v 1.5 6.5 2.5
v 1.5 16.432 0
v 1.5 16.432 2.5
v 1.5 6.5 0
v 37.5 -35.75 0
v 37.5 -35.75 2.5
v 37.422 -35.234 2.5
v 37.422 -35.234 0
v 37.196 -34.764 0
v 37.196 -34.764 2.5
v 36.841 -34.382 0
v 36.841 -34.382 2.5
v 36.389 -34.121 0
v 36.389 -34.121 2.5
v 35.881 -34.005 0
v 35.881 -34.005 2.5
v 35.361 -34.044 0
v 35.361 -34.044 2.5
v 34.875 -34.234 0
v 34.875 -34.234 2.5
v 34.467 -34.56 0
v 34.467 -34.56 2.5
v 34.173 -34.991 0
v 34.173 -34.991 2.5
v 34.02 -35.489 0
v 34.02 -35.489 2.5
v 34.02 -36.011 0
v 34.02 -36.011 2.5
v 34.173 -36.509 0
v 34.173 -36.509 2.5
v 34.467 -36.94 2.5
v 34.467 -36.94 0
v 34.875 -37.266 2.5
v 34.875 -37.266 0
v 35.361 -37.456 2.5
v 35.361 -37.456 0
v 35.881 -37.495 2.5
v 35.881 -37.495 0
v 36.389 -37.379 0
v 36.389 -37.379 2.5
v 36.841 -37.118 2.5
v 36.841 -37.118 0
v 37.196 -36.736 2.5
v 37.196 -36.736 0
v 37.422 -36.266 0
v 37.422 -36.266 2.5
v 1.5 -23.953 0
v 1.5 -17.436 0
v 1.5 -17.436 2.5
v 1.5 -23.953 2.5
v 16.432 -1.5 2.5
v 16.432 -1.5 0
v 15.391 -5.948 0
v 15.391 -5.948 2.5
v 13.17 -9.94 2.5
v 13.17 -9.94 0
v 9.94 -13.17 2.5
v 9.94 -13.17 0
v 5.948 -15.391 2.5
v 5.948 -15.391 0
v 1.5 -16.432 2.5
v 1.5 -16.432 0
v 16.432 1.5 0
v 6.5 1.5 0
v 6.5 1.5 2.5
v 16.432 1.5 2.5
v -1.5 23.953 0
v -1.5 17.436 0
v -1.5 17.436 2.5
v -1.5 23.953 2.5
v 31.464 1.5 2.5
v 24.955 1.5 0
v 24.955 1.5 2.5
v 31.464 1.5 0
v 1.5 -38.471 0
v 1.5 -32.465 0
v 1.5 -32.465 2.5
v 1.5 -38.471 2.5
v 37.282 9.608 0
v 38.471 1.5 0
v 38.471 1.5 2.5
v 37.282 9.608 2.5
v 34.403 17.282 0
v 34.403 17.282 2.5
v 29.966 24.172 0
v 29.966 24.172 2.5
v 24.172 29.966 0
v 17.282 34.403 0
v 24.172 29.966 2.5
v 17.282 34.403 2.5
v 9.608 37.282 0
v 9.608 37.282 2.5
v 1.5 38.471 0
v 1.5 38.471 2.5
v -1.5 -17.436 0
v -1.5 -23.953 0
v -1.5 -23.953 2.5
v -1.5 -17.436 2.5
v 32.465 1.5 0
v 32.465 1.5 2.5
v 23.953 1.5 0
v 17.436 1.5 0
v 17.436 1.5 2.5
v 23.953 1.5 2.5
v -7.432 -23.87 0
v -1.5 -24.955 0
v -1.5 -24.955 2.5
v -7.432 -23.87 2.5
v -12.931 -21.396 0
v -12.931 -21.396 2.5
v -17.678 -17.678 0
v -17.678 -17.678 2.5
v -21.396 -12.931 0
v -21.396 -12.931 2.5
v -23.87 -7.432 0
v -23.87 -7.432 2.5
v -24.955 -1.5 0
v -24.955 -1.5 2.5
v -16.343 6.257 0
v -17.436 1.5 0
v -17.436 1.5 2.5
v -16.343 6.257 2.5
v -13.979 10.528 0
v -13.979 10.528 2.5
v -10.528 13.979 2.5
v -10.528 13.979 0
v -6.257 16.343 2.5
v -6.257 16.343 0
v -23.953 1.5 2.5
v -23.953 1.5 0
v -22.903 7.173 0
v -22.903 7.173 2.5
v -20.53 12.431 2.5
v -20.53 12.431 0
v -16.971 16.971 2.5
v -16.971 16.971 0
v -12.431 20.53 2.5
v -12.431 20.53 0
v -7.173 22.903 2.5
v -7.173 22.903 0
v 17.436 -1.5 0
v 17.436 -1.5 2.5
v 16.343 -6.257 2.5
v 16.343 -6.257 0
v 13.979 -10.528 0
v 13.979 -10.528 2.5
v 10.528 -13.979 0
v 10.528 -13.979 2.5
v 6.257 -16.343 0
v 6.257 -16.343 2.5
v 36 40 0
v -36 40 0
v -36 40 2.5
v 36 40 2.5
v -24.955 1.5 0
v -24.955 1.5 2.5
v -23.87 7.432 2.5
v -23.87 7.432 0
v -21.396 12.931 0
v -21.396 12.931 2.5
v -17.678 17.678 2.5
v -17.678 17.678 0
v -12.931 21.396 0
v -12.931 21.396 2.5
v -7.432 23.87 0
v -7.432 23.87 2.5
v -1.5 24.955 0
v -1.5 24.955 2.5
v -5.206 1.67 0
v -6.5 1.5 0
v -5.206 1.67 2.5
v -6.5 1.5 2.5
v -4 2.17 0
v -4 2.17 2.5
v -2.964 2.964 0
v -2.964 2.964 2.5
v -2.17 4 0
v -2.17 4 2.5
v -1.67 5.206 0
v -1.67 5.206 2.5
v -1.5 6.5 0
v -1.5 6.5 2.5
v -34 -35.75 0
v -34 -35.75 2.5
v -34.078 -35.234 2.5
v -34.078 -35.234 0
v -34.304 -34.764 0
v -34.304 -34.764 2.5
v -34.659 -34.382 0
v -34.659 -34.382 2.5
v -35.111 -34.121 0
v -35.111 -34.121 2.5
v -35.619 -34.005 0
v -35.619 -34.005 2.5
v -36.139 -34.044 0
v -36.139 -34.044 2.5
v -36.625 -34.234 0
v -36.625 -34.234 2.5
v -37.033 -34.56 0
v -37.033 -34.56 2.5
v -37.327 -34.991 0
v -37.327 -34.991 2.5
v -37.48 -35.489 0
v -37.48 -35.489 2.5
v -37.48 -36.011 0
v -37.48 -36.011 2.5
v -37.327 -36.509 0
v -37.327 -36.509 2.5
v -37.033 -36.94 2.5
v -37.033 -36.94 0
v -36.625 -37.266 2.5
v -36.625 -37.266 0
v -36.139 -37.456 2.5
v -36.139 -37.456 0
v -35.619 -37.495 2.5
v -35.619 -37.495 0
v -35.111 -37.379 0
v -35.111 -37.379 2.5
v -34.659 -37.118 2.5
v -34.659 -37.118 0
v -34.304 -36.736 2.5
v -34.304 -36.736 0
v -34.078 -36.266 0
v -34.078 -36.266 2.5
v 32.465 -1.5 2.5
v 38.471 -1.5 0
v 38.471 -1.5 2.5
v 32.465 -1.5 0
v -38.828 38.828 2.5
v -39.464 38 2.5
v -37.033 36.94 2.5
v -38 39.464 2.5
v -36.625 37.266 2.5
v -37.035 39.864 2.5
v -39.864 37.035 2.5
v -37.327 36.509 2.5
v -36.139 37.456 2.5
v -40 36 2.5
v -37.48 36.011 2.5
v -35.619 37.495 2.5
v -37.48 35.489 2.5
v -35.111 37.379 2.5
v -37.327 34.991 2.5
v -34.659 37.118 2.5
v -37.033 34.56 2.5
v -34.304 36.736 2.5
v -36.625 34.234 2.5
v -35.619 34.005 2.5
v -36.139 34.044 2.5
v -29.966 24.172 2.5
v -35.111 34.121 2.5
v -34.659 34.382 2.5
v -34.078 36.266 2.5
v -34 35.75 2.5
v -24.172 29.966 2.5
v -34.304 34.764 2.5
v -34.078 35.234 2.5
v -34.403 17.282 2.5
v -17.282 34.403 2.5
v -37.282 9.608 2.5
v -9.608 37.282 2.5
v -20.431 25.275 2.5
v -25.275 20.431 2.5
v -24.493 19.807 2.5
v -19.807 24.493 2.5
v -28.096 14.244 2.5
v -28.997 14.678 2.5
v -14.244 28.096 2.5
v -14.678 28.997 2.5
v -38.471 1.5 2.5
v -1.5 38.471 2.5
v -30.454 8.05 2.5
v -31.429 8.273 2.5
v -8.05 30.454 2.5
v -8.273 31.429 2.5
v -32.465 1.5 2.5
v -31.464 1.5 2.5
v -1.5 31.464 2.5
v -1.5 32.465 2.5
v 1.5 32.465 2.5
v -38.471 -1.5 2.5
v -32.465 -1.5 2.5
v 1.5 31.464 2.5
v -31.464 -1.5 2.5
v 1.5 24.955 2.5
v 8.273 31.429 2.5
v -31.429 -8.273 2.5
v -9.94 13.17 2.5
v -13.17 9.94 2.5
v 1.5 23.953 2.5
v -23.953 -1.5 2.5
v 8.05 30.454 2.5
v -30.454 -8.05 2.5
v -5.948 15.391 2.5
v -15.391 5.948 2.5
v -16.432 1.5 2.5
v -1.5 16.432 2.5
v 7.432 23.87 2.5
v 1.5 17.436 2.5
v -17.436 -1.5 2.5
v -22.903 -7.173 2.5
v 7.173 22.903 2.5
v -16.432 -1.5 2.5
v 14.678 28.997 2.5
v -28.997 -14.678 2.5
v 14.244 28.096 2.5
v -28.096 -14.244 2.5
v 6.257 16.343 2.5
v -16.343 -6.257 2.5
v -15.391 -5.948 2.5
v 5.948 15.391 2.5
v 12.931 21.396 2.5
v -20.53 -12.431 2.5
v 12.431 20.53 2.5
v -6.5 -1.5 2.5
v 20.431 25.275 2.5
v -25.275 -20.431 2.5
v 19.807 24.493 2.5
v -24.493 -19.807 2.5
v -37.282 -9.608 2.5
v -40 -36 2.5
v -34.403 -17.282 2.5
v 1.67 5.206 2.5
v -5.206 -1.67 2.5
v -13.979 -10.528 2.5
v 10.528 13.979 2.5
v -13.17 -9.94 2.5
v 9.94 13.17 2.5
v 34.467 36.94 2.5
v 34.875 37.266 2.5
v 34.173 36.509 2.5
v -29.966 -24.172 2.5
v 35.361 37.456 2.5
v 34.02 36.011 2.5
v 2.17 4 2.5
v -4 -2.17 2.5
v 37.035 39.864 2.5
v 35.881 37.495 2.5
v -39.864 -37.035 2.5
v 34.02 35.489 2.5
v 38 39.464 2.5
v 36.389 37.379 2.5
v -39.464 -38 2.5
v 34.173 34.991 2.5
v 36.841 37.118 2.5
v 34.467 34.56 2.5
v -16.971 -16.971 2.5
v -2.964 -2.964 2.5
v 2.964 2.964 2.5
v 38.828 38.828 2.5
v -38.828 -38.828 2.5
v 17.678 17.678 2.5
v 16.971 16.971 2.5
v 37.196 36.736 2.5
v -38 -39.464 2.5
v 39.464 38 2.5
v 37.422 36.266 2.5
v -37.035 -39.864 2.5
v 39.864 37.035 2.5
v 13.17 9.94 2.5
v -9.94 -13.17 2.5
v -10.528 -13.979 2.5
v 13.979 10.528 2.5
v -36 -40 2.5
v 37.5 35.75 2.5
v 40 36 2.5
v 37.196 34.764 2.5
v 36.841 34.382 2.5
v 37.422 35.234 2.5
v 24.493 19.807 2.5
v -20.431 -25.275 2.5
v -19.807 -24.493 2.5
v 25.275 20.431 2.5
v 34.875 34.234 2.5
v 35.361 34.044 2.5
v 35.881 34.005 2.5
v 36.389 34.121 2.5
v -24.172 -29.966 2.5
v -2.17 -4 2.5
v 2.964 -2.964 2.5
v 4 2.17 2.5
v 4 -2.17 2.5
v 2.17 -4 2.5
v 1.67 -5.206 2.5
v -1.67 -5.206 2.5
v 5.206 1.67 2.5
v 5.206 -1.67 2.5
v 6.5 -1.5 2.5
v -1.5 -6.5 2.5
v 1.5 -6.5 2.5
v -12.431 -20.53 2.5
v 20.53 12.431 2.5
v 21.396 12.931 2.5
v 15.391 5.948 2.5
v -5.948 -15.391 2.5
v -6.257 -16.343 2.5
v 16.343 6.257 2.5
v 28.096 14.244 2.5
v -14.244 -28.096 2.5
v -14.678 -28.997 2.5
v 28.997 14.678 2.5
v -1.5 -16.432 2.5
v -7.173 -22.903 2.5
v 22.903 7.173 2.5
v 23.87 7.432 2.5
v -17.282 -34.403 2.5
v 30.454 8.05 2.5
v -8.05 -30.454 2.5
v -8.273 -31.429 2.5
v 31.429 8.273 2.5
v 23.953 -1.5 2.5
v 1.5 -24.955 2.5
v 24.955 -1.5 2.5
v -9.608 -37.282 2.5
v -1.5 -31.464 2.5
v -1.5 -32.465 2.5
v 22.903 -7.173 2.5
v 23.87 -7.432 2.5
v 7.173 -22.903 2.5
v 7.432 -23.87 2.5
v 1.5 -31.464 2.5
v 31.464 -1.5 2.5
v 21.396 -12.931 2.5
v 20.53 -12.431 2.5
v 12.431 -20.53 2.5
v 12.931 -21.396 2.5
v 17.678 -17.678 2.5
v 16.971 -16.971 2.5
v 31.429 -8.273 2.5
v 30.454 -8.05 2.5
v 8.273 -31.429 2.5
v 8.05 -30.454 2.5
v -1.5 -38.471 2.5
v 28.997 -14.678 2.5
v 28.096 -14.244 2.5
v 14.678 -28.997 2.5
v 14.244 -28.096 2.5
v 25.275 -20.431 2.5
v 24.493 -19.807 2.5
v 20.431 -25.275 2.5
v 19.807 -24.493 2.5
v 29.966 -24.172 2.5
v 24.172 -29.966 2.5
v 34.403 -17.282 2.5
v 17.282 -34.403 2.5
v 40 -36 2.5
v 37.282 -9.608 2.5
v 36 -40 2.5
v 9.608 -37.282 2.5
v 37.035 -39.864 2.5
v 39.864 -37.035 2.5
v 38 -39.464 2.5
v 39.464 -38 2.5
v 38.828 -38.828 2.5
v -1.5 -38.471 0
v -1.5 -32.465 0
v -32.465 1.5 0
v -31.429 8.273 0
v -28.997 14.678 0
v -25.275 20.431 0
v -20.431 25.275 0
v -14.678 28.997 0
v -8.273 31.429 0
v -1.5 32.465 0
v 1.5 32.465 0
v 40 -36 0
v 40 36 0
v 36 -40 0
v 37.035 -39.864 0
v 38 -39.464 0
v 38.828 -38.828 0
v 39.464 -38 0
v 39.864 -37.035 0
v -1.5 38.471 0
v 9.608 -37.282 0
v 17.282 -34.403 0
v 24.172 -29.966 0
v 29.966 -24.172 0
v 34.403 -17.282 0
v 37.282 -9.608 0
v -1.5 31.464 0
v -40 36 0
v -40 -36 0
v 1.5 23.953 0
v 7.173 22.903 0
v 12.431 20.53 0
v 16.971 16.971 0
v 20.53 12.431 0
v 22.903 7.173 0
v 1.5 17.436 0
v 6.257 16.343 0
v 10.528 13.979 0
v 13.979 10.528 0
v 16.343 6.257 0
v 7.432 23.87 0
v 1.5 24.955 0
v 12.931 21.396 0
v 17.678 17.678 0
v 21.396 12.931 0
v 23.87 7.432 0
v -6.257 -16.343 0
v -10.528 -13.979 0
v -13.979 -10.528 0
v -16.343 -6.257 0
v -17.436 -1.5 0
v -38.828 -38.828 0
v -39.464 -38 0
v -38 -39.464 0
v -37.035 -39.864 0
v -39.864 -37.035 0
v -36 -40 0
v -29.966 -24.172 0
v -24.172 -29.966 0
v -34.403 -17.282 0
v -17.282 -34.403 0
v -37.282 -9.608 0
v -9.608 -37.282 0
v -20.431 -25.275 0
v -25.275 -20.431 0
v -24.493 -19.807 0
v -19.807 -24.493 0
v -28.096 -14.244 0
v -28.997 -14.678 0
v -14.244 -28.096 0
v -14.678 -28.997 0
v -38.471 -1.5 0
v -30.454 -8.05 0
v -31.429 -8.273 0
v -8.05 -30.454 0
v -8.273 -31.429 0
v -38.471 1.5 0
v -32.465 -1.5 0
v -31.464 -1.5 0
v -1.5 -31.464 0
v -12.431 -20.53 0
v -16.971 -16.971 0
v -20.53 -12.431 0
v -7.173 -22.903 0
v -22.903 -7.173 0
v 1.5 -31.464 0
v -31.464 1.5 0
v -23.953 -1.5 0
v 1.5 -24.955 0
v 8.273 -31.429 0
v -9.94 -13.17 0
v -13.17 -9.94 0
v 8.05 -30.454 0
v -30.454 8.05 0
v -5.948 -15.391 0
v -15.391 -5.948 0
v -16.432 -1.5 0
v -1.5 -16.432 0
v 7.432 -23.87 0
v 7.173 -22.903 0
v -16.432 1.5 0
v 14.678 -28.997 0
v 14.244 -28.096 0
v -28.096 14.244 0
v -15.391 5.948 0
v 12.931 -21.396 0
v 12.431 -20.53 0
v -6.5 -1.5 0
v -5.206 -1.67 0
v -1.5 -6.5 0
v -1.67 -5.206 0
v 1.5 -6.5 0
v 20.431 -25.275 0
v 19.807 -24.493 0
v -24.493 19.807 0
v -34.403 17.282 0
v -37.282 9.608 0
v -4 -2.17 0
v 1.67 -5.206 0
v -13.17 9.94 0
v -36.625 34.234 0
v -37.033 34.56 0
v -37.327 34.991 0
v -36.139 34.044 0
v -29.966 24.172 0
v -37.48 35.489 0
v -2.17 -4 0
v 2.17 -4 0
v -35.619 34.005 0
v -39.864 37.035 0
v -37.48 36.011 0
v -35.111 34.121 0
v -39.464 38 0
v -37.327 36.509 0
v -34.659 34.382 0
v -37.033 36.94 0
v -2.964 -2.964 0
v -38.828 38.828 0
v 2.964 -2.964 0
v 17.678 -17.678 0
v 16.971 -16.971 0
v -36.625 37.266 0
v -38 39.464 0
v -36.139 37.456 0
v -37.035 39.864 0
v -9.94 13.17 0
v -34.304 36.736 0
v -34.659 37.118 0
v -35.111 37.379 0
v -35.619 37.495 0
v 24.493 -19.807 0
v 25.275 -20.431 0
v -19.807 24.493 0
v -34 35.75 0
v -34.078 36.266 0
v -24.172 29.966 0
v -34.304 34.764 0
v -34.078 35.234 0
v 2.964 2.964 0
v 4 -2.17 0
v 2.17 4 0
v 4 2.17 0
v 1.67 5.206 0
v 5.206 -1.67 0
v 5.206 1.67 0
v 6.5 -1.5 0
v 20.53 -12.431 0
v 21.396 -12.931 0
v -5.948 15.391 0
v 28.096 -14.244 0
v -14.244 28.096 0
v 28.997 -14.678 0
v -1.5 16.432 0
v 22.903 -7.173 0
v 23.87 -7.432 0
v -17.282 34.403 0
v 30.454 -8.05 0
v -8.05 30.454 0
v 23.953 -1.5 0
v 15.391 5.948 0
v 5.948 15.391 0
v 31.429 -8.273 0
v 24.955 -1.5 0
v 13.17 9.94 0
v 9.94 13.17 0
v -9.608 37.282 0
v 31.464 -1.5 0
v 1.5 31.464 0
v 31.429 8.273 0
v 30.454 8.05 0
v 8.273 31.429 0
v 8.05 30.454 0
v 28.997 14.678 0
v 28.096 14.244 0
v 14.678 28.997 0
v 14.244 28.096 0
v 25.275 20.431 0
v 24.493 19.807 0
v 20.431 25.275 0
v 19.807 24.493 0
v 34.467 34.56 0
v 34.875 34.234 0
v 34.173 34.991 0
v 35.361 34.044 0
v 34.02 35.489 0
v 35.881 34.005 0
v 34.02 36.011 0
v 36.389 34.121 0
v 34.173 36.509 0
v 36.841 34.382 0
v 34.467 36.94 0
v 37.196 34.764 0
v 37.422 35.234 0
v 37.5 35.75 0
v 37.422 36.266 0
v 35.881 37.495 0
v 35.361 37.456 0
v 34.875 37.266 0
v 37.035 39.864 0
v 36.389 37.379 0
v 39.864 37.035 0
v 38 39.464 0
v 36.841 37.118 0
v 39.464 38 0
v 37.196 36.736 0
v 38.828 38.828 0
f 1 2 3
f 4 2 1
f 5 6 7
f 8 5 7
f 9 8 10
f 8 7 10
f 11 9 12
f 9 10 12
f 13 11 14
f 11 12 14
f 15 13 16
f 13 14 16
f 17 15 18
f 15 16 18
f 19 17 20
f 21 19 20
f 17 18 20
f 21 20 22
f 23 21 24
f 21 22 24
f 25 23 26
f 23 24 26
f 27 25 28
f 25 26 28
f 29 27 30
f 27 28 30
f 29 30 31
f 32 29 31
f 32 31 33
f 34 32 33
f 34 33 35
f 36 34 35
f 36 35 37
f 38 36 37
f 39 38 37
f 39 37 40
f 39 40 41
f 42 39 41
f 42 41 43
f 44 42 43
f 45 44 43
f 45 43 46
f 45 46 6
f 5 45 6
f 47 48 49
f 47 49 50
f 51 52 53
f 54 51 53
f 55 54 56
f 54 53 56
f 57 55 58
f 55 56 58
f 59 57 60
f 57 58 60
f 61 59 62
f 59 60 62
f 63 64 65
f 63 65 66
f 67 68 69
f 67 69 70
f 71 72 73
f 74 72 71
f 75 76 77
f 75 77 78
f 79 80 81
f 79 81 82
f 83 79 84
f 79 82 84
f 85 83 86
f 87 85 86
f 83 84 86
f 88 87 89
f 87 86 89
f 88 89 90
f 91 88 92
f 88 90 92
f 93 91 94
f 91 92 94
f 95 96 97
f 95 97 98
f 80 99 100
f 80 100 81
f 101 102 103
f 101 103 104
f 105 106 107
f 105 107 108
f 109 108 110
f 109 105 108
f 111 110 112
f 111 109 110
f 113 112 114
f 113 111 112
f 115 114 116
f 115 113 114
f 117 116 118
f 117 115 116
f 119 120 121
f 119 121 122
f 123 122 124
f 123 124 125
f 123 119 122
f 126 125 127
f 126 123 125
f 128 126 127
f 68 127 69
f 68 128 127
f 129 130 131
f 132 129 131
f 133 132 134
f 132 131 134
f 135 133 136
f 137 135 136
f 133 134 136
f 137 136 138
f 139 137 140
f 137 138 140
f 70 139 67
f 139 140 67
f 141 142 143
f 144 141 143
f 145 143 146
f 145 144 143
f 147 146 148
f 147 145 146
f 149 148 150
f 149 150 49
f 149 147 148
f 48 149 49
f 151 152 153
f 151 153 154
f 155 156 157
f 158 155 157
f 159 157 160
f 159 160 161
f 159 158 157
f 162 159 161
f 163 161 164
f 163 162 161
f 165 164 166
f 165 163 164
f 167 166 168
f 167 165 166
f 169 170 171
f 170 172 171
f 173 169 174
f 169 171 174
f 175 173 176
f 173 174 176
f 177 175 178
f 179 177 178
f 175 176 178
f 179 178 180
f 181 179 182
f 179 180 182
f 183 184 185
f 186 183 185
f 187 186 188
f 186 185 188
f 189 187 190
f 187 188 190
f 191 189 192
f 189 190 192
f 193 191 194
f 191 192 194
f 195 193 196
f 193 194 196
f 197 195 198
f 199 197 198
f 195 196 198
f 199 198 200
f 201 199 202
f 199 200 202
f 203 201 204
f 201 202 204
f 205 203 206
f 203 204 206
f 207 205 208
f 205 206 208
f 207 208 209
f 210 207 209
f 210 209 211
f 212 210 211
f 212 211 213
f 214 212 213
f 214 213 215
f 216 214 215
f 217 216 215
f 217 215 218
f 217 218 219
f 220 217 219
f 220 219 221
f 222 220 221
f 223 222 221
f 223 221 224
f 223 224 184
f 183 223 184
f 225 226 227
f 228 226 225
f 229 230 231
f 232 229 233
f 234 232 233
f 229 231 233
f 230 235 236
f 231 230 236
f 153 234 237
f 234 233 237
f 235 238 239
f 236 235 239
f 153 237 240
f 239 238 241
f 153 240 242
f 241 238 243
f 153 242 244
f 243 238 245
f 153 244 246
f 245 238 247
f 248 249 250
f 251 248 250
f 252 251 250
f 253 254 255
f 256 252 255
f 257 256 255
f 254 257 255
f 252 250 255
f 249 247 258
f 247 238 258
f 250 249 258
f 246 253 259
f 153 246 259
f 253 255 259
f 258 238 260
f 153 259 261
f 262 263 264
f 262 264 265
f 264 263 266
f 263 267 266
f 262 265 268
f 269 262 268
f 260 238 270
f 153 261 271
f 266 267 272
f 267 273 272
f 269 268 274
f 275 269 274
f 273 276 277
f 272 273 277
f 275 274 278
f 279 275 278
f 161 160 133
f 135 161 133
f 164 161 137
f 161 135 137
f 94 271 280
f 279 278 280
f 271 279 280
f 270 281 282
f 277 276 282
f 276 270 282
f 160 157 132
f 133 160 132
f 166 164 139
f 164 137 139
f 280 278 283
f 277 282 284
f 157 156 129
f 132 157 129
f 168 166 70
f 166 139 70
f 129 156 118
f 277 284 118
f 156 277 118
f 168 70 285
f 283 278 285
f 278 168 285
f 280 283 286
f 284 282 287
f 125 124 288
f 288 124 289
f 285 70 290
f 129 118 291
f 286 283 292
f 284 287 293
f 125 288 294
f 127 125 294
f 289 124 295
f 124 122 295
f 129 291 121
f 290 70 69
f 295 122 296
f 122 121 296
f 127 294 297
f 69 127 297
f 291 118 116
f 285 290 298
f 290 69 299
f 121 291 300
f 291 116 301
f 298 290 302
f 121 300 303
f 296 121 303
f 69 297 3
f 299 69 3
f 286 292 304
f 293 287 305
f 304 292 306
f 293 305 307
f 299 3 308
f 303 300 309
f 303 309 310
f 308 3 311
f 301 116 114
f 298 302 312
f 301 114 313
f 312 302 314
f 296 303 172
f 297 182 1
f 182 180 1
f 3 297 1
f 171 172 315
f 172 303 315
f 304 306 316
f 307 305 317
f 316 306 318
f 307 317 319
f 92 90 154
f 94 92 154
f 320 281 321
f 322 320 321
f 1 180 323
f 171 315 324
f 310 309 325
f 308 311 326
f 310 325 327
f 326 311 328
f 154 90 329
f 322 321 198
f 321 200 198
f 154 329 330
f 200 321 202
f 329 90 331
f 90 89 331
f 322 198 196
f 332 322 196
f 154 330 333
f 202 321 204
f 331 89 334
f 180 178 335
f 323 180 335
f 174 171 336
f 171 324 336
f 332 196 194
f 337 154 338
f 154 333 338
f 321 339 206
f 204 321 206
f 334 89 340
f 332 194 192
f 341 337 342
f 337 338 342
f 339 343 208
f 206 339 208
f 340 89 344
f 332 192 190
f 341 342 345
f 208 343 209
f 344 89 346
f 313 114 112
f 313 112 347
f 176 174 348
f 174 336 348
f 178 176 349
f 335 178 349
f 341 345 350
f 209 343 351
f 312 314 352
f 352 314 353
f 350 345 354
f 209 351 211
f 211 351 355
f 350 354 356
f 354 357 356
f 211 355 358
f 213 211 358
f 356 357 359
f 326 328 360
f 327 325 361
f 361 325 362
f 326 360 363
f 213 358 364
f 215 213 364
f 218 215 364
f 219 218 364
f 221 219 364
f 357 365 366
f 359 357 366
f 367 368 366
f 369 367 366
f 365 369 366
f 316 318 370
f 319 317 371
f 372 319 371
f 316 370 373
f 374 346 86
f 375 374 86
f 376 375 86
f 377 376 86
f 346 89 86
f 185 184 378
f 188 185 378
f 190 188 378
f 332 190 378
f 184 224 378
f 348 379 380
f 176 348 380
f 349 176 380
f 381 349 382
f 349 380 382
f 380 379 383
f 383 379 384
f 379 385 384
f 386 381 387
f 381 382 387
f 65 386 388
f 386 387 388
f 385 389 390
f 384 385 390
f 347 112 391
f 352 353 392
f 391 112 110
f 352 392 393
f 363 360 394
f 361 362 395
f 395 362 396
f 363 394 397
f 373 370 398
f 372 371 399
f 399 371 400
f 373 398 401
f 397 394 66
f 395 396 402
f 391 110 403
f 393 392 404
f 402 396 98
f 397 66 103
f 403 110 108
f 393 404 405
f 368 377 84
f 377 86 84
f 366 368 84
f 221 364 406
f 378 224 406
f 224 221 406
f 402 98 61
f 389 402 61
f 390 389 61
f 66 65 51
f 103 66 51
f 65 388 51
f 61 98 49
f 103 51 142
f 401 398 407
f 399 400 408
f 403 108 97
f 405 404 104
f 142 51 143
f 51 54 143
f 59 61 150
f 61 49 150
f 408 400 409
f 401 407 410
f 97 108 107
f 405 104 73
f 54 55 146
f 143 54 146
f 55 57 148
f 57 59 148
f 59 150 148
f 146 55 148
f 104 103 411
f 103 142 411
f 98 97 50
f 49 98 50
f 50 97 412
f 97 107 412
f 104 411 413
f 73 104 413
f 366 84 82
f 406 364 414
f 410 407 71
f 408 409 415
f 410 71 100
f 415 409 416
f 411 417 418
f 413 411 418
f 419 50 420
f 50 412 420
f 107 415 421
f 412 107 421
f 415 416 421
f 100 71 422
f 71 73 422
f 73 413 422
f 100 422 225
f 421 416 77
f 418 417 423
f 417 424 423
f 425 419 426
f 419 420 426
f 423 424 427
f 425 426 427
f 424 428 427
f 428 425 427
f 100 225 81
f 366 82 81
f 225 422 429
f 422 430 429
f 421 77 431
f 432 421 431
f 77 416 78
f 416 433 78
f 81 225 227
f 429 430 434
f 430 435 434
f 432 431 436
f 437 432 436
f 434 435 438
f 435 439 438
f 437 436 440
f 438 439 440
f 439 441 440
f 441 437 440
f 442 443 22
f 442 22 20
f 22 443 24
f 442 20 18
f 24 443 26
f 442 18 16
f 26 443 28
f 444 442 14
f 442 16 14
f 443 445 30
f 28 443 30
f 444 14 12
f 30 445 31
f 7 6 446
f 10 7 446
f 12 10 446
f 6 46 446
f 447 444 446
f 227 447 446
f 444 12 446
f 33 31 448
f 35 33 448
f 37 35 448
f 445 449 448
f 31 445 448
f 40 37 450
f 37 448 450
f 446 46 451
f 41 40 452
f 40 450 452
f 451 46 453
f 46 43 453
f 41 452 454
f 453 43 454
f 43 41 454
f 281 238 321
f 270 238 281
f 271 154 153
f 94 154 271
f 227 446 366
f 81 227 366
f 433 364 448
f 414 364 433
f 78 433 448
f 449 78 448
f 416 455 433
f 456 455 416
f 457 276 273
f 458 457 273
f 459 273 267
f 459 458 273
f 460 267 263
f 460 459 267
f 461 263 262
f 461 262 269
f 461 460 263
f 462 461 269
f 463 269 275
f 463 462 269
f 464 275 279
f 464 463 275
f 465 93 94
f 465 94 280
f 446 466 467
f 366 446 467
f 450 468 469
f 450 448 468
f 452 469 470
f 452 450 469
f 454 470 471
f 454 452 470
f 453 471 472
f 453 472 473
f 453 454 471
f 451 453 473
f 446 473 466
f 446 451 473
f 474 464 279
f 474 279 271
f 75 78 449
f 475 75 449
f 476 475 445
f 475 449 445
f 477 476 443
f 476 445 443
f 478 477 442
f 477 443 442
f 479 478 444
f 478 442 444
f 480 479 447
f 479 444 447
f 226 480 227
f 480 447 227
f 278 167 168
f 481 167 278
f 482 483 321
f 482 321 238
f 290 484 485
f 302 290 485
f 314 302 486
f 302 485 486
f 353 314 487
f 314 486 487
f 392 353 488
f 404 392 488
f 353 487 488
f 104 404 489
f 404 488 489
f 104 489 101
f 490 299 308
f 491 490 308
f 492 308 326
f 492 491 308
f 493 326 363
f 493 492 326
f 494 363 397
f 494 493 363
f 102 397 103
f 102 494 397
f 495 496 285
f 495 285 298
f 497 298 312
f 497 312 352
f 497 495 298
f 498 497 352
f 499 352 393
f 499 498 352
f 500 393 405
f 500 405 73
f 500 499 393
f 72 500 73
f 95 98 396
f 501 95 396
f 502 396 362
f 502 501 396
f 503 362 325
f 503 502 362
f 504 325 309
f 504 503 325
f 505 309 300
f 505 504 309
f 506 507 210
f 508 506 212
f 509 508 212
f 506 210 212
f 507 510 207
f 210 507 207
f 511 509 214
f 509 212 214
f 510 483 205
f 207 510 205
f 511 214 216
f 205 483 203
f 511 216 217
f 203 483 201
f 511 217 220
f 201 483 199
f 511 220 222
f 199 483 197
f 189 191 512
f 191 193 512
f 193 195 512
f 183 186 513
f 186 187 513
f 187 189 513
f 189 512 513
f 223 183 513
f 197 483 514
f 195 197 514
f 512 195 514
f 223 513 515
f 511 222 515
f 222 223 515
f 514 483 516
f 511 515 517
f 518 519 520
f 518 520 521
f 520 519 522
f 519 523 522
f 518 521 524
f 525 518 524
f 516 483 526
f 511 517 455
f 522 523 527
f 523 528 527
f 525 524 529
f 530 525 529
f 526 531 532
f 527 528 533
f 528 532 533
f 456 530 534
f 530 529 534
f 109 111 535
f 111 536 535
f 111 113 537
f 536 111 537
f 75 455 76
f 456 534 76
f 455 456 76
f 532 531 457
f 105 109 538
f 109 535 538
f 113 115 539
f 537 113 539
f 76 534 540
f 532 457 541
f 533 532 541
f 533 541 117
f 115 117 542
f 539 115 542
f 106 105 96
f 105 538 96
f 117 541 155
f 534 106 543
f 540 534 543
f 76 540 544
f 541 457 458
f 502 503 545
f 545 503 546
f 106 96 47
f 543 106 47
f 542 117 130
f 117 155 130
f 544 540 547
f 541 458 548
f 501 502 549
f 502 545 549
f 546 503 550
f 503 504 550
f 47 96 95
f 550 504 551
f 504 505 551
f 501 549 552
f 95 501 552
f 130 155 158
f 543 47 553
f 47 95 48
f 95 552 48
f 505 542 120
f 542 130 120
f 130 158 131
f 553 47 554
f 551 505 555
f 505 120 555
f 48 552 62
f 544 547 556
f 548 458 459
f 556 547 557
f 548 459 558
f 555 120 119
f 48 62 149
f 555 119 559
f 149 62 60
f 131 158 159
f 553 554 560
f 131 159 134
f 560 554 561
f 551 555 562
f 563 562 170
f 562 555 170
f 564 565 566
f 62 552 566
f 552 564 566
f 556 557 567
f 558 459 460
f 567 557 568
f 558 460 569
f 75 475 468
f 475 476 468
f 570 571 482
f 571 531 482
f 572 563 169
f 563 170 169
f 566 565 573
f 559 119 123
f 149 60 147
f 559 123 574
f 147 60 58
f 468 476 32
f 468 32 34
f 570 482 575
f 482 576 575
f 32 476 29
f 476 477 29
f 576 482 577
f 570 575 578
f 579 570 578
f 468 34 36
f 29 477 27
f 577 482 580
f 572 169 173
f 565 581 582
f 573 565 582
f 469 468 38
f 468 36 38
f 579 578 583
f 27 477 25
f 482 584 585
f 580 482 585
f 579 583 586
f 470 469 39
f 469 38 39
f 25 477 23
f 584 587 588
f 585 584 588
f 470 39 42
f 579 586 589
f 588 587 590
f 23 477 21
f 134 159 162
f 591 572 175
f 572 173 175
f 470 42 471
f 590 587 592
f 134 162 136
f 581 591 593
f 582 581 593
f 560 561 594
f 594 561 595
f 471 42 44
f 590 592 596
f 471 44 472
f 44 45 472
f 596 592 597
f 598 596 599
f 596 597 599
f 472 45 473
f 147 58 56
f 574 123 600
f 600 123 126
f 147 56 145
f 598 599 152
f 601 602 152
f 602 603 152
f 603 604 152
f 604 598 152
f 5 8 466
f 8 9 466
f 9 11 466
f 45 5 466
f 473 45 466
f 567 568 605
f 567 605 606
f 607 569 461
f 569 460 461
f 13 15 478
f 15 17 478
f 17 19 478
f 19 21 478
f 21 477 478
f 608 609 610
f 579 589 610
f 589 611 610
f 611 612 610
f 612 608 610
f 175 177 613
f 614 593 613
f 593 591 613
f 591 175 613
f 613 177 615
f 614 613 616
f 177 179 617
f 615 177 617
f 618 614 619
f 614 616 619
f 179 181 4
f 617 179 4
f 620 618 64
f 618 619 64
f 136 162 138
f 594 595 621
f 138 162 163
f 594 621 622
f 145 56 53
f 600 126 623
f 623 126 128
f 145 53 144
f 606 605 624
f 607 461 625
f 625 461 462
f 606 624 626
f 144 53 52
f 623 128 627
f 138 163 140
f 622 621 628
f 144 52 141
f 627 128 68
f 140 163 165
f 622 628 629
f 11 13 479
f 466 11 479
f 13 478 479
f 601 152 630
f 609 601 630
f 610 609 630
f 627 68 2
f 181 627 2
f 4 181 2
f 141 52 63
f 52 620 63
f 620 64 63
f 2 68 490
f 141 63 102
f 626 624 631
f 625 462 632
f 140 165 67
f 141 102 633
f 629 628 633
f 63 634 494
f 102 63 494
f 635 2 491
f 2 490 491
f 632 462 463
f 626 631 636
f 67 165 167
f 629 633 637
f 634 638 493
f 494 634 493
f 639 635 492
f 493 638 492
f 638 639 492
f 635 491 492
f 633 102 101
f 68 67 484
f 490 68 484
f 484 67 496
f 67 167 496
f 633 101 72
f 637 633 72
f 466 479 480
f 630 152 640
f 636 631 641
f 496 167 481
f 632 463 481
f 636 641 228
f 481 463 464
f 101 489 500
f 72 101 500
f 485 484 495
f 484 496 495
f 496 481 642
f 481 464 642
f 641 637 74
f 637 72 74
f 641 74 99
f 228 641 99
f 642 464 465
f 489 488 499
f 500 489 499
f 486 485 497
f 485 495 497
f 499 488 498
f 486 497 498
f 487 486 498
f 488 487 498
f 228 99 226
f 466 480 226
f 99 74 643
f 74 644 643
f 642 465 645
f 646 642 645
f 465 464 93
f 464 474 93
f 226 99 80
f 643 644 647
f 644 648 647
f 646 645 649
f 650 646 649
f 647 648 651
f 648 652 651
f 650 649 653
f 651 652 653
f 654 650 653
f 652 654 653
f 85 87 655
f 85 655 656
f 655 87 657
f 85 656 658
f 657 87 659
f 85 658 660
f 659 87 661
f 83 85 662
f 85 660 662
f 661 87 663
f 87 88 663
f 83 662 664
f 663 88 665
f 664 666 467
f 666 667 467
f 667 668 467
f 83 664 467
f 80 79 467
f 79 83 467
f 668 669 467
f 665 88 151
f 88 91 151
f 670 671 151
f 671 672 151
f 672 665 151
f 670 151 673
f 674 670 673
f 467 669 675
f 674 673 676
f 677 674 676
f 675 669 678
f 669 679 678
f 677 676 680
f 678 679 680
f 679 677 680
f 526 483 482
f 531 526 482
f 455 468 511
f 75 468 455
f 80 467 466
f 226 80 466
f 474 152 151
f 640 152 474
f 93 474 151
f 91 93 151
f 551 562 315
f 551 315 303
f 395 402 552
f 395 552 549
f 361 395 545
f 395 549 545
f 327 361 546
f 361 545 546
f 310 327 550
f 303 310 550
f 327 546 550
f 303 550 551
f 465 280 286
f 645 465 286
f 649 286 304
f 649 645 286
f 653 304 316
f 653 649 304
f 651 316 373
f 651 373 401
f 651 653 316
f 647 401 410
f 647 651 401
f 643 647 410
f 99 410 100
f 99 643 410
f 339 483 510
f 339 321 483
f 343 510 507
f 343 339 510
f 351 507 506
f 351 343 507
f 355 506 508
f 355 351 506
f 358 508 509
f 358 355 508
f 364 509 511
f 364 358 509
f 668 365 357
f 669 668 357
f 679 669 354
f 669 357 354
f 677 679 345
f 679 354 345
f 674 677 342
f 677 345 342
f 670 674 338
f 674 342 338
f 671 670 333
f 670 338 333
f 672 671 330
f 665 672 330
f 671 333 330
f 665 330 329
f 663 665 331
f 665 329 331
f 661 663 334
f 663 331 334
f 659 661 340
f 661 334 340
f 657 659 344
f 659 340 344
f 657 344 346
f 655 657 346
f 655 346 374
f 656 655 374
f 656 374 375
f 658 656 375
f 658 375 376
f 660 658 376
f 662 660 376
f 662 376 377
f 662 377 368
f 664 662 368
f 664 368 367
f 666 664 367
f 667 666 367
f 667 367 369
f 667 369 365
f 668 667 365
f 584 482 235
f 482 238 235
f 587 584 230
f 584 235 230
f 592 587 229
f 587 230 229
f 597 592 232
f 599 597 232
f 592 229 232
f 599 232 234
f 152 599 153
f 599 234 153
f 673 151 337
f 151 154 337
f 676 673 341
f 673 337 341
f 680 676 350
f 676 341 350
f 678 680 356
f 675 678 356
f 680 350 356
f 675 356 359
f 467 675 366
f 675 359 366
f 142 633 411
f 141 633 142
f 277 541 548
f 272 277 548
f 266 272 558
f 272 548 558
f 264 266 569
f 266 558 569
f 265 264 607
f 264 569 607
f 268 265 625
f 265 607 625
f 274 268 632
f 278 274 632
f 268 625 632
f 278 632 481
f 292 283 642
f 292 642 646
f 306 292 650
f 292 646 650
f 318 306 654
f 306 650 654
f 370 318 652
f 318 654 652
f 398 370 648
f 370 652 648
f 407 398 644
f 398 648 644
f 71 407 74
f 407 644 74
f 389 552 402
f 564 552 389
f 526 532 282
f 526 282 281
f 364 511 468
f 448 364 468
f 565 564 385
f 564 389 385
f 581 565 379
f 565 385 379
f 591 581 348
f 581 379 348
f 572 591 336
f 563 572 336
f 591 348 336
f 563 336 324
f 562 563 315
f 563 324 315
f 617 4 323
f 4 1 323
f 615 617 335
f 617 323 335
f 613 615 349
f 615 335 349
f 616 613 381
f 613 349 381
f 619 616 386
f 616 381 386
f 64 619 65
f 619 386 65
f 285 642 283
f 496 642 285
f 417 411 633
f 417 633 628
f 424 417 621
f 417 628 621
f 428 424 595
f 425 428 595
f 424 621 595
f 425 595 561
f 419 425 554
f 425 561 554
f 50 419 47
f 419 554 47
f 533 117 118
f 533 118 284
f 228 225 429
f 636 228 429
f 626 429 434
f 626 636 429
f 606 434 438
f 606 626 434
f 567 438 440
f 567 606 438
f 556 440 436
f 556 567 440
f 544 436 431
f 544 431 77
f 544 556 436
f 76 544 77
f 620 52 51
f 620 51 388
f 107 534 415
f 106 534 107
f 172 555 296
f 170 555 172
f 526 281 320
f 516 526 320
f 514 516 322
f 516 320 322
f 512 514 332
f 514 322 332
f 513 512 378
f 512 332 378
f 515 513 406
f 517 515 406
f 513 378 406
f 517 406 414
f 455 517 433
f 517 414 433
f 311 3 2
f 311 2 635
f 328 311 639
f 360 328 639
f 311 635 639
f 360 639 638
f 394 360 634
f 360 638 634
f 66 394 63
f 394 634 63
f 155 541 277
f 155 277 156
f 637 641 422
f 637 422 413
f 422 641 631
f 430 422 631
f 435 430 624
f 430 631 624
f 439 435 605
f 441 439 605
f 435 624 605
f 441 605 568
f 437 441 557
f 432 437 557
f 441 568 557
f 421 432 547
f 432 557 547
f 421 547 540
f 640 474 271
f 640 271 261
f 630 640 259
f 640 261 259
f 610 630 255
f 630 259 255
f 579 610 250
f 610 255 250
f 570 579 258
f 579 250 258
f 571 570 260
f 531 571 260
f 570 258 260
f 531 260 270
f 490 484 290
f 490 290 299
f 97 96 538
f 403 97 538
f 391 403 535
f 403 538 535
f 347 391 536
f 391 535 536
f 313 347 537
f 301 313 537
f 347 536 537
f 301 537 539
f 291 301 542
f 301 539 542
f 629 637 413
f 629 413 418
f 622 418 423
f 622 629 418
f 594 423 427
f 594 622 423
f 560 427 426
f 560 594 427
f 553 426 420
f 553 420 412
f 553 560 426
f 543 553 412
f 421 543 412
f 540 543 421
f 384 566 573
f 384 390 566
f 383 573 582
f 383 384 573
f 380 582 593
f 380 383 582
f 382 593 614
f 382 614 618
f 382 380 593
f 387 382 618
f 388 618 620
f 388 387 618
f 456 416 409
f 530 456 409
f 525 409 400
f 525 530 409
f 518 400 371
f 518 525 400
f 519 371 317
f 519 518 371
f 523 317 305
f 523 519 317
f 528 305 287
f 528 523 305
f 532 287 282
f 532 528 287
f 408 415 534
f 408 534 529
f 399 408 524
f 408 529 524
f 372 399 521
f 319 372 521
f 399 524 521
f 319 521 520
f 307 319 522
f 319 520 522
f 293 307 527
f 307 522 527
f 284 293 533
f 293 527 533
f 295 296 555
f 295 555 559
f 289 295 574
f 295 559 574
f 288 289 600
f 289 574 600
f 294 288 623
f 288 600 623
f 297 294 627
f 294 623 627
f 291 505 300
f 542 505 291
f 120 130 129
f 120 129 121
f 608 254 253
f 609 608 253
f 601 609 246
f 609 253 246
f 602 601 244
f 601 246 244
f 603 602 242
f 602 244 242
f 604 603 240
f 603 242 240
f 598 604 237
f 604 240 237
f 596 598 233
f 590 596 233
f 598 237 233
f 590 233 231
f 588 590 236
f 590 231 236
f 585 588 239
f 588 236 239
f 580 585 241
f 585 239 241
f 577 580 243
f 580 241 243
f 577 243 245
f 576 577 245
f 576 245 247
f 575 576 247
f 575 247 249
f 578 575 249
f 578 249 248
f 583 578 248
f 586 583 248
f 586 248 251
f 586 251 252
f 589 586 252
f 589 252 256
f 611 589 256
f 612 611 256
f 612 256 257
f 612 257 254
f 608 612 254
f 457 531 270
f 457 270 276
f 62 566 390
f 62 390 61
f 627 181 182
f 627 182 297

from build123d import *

# Parameters (mm, degrees)
SKETCH_W      = 80
SKETCH_H      = 80
PAD_DEPTH     = 2.5
SKETCH001_R   = 38.5
SKETCH001_R_2 = 1.75
POCKET_DEPTH  = 5
PAD001_DEPTH  = 2.5
SKETCH003_R   = 32.5
SKETCH003_R_2 = 31.5
PAD002_DEPTH  = 2.5
SKETCH004_R   = 25
SKETCH004_R_2 = 24
PAD003_DEPTH  = 2.5
SKETCH005_R   = 17.5
SKETCH005_R_2 = 16.5
PAD004_DEPTH  = 2.5
FILLET_R      = 4
FILLET001_R   = 5


with BuildPart() as part:
    # Sketch → Pad (new body)
    with BuildSketch(Plane.XY):
        Rectangle(SKETCH_W, SKETCH_H)
    extrude(amount=PAD_DEPTH)

    # Sketch001 (on Face6 of Pad) → Pocket (cut)
    with BuildSketch(Plane.XY.offset(2.5)):
        Circle(SKETCH001_R)
        with Locations((35.75, 35.75)):
            Circle(SKETCH001_R_2)
        with Locations((-35.75, 35.75)):
            Circle(SKETCH001_R_2)
        with Locations((-35.75, -35.75)):
            Circle(SKETCH001_R_2)
        with Locations((35.75, -35.75)):
            Circle(SKETCH001_R_2)
    extrude(amount=-POCKET_DEPTH, mode=Mode.SUBTRACT)

    # Sketch002 (on Face4 of Pocket) → Pad001 (join)
    with BuildSketch(Plane(origin=(0, 0, 0), x_dir=(1, 0, 0), z_dir=(0, 0, -1))):
        Polygon((1.5, 39.224094), (-1.5, 39.224094), (-1.5, 1.5), (-39.182049, 1.5), (-39.182049, -1.5), (-1.5, -1.5), (-1.5, -39.571514), (1.5, -39.571514), (1.5, -1.5), (38.958385, -1.5), (38.958385, 1.5), (1.5, 1.5), align=None)
    extrude(amount=-PAD001_DEPTH)

    # Sketch003 (on Face23 of Pad001) → Pad002 (join)
    with BuildSketch(Plane(origin=(0, 0, 0), x_dir=(1, 0, 0), z_dir=(0, 0, -1))):
        Circle(SKETCH003_R)
        Circle(SKETCH003_R_2, mode=Mode.SUBTRACT)
    extrude(amount=-PAD002_DEPTH)

    # Sketch004 (on Face53 of Pad002) → Pad003 (join)
    with BuildSketch(Plane(origin=(0, 0, 0), x_dir=(1, 0, 0), z_dir=(0, 0, -1))):
        Circle(SKETCH004_R)
        Circle(SKETCH004_R_2, mode=Mode.SUBTRACT)
    extrude(amount=-PAD003_DEPTH)

    # Sketch005 (on Face89 of Pad003) → Pad004 (join)
    with BuildSketch(Plane(origin=(0, 0, 0), x_dir=(1, 0, 0), z_dir=(0, 0, -1))):
        Circle(SKETCH005_R)
        Circle(SKETCH005_R_2, mode=Mode.SUBTRACT)
    extrude(amount=-PAD004_DEPTH)

    # Fillet
    fillet_edges = [part.edges().sort_by_distance(p)[0] for p in [
        (-40, 40, 1.25),
        (40, 40, 1.25),
        (40, -40, 1.25),
        (-40, -40, 1.25),
    ]]
    fillet(fillet_edges, radius=FILLET_R)

    # Fillet001
    fillet001_edges = [part.edges().sort_by_distance(p)[0] for p in [
        (-1.5, 1.5, 1.25),
        (-1.5, -1.5, 1.25),
        (1.5, -1.5, 1.25),
        (1.5, 1.5, 1.25),
    ]]
    fillet(fillet001_edges, radius=FILLET001_R)


solid = part.part
